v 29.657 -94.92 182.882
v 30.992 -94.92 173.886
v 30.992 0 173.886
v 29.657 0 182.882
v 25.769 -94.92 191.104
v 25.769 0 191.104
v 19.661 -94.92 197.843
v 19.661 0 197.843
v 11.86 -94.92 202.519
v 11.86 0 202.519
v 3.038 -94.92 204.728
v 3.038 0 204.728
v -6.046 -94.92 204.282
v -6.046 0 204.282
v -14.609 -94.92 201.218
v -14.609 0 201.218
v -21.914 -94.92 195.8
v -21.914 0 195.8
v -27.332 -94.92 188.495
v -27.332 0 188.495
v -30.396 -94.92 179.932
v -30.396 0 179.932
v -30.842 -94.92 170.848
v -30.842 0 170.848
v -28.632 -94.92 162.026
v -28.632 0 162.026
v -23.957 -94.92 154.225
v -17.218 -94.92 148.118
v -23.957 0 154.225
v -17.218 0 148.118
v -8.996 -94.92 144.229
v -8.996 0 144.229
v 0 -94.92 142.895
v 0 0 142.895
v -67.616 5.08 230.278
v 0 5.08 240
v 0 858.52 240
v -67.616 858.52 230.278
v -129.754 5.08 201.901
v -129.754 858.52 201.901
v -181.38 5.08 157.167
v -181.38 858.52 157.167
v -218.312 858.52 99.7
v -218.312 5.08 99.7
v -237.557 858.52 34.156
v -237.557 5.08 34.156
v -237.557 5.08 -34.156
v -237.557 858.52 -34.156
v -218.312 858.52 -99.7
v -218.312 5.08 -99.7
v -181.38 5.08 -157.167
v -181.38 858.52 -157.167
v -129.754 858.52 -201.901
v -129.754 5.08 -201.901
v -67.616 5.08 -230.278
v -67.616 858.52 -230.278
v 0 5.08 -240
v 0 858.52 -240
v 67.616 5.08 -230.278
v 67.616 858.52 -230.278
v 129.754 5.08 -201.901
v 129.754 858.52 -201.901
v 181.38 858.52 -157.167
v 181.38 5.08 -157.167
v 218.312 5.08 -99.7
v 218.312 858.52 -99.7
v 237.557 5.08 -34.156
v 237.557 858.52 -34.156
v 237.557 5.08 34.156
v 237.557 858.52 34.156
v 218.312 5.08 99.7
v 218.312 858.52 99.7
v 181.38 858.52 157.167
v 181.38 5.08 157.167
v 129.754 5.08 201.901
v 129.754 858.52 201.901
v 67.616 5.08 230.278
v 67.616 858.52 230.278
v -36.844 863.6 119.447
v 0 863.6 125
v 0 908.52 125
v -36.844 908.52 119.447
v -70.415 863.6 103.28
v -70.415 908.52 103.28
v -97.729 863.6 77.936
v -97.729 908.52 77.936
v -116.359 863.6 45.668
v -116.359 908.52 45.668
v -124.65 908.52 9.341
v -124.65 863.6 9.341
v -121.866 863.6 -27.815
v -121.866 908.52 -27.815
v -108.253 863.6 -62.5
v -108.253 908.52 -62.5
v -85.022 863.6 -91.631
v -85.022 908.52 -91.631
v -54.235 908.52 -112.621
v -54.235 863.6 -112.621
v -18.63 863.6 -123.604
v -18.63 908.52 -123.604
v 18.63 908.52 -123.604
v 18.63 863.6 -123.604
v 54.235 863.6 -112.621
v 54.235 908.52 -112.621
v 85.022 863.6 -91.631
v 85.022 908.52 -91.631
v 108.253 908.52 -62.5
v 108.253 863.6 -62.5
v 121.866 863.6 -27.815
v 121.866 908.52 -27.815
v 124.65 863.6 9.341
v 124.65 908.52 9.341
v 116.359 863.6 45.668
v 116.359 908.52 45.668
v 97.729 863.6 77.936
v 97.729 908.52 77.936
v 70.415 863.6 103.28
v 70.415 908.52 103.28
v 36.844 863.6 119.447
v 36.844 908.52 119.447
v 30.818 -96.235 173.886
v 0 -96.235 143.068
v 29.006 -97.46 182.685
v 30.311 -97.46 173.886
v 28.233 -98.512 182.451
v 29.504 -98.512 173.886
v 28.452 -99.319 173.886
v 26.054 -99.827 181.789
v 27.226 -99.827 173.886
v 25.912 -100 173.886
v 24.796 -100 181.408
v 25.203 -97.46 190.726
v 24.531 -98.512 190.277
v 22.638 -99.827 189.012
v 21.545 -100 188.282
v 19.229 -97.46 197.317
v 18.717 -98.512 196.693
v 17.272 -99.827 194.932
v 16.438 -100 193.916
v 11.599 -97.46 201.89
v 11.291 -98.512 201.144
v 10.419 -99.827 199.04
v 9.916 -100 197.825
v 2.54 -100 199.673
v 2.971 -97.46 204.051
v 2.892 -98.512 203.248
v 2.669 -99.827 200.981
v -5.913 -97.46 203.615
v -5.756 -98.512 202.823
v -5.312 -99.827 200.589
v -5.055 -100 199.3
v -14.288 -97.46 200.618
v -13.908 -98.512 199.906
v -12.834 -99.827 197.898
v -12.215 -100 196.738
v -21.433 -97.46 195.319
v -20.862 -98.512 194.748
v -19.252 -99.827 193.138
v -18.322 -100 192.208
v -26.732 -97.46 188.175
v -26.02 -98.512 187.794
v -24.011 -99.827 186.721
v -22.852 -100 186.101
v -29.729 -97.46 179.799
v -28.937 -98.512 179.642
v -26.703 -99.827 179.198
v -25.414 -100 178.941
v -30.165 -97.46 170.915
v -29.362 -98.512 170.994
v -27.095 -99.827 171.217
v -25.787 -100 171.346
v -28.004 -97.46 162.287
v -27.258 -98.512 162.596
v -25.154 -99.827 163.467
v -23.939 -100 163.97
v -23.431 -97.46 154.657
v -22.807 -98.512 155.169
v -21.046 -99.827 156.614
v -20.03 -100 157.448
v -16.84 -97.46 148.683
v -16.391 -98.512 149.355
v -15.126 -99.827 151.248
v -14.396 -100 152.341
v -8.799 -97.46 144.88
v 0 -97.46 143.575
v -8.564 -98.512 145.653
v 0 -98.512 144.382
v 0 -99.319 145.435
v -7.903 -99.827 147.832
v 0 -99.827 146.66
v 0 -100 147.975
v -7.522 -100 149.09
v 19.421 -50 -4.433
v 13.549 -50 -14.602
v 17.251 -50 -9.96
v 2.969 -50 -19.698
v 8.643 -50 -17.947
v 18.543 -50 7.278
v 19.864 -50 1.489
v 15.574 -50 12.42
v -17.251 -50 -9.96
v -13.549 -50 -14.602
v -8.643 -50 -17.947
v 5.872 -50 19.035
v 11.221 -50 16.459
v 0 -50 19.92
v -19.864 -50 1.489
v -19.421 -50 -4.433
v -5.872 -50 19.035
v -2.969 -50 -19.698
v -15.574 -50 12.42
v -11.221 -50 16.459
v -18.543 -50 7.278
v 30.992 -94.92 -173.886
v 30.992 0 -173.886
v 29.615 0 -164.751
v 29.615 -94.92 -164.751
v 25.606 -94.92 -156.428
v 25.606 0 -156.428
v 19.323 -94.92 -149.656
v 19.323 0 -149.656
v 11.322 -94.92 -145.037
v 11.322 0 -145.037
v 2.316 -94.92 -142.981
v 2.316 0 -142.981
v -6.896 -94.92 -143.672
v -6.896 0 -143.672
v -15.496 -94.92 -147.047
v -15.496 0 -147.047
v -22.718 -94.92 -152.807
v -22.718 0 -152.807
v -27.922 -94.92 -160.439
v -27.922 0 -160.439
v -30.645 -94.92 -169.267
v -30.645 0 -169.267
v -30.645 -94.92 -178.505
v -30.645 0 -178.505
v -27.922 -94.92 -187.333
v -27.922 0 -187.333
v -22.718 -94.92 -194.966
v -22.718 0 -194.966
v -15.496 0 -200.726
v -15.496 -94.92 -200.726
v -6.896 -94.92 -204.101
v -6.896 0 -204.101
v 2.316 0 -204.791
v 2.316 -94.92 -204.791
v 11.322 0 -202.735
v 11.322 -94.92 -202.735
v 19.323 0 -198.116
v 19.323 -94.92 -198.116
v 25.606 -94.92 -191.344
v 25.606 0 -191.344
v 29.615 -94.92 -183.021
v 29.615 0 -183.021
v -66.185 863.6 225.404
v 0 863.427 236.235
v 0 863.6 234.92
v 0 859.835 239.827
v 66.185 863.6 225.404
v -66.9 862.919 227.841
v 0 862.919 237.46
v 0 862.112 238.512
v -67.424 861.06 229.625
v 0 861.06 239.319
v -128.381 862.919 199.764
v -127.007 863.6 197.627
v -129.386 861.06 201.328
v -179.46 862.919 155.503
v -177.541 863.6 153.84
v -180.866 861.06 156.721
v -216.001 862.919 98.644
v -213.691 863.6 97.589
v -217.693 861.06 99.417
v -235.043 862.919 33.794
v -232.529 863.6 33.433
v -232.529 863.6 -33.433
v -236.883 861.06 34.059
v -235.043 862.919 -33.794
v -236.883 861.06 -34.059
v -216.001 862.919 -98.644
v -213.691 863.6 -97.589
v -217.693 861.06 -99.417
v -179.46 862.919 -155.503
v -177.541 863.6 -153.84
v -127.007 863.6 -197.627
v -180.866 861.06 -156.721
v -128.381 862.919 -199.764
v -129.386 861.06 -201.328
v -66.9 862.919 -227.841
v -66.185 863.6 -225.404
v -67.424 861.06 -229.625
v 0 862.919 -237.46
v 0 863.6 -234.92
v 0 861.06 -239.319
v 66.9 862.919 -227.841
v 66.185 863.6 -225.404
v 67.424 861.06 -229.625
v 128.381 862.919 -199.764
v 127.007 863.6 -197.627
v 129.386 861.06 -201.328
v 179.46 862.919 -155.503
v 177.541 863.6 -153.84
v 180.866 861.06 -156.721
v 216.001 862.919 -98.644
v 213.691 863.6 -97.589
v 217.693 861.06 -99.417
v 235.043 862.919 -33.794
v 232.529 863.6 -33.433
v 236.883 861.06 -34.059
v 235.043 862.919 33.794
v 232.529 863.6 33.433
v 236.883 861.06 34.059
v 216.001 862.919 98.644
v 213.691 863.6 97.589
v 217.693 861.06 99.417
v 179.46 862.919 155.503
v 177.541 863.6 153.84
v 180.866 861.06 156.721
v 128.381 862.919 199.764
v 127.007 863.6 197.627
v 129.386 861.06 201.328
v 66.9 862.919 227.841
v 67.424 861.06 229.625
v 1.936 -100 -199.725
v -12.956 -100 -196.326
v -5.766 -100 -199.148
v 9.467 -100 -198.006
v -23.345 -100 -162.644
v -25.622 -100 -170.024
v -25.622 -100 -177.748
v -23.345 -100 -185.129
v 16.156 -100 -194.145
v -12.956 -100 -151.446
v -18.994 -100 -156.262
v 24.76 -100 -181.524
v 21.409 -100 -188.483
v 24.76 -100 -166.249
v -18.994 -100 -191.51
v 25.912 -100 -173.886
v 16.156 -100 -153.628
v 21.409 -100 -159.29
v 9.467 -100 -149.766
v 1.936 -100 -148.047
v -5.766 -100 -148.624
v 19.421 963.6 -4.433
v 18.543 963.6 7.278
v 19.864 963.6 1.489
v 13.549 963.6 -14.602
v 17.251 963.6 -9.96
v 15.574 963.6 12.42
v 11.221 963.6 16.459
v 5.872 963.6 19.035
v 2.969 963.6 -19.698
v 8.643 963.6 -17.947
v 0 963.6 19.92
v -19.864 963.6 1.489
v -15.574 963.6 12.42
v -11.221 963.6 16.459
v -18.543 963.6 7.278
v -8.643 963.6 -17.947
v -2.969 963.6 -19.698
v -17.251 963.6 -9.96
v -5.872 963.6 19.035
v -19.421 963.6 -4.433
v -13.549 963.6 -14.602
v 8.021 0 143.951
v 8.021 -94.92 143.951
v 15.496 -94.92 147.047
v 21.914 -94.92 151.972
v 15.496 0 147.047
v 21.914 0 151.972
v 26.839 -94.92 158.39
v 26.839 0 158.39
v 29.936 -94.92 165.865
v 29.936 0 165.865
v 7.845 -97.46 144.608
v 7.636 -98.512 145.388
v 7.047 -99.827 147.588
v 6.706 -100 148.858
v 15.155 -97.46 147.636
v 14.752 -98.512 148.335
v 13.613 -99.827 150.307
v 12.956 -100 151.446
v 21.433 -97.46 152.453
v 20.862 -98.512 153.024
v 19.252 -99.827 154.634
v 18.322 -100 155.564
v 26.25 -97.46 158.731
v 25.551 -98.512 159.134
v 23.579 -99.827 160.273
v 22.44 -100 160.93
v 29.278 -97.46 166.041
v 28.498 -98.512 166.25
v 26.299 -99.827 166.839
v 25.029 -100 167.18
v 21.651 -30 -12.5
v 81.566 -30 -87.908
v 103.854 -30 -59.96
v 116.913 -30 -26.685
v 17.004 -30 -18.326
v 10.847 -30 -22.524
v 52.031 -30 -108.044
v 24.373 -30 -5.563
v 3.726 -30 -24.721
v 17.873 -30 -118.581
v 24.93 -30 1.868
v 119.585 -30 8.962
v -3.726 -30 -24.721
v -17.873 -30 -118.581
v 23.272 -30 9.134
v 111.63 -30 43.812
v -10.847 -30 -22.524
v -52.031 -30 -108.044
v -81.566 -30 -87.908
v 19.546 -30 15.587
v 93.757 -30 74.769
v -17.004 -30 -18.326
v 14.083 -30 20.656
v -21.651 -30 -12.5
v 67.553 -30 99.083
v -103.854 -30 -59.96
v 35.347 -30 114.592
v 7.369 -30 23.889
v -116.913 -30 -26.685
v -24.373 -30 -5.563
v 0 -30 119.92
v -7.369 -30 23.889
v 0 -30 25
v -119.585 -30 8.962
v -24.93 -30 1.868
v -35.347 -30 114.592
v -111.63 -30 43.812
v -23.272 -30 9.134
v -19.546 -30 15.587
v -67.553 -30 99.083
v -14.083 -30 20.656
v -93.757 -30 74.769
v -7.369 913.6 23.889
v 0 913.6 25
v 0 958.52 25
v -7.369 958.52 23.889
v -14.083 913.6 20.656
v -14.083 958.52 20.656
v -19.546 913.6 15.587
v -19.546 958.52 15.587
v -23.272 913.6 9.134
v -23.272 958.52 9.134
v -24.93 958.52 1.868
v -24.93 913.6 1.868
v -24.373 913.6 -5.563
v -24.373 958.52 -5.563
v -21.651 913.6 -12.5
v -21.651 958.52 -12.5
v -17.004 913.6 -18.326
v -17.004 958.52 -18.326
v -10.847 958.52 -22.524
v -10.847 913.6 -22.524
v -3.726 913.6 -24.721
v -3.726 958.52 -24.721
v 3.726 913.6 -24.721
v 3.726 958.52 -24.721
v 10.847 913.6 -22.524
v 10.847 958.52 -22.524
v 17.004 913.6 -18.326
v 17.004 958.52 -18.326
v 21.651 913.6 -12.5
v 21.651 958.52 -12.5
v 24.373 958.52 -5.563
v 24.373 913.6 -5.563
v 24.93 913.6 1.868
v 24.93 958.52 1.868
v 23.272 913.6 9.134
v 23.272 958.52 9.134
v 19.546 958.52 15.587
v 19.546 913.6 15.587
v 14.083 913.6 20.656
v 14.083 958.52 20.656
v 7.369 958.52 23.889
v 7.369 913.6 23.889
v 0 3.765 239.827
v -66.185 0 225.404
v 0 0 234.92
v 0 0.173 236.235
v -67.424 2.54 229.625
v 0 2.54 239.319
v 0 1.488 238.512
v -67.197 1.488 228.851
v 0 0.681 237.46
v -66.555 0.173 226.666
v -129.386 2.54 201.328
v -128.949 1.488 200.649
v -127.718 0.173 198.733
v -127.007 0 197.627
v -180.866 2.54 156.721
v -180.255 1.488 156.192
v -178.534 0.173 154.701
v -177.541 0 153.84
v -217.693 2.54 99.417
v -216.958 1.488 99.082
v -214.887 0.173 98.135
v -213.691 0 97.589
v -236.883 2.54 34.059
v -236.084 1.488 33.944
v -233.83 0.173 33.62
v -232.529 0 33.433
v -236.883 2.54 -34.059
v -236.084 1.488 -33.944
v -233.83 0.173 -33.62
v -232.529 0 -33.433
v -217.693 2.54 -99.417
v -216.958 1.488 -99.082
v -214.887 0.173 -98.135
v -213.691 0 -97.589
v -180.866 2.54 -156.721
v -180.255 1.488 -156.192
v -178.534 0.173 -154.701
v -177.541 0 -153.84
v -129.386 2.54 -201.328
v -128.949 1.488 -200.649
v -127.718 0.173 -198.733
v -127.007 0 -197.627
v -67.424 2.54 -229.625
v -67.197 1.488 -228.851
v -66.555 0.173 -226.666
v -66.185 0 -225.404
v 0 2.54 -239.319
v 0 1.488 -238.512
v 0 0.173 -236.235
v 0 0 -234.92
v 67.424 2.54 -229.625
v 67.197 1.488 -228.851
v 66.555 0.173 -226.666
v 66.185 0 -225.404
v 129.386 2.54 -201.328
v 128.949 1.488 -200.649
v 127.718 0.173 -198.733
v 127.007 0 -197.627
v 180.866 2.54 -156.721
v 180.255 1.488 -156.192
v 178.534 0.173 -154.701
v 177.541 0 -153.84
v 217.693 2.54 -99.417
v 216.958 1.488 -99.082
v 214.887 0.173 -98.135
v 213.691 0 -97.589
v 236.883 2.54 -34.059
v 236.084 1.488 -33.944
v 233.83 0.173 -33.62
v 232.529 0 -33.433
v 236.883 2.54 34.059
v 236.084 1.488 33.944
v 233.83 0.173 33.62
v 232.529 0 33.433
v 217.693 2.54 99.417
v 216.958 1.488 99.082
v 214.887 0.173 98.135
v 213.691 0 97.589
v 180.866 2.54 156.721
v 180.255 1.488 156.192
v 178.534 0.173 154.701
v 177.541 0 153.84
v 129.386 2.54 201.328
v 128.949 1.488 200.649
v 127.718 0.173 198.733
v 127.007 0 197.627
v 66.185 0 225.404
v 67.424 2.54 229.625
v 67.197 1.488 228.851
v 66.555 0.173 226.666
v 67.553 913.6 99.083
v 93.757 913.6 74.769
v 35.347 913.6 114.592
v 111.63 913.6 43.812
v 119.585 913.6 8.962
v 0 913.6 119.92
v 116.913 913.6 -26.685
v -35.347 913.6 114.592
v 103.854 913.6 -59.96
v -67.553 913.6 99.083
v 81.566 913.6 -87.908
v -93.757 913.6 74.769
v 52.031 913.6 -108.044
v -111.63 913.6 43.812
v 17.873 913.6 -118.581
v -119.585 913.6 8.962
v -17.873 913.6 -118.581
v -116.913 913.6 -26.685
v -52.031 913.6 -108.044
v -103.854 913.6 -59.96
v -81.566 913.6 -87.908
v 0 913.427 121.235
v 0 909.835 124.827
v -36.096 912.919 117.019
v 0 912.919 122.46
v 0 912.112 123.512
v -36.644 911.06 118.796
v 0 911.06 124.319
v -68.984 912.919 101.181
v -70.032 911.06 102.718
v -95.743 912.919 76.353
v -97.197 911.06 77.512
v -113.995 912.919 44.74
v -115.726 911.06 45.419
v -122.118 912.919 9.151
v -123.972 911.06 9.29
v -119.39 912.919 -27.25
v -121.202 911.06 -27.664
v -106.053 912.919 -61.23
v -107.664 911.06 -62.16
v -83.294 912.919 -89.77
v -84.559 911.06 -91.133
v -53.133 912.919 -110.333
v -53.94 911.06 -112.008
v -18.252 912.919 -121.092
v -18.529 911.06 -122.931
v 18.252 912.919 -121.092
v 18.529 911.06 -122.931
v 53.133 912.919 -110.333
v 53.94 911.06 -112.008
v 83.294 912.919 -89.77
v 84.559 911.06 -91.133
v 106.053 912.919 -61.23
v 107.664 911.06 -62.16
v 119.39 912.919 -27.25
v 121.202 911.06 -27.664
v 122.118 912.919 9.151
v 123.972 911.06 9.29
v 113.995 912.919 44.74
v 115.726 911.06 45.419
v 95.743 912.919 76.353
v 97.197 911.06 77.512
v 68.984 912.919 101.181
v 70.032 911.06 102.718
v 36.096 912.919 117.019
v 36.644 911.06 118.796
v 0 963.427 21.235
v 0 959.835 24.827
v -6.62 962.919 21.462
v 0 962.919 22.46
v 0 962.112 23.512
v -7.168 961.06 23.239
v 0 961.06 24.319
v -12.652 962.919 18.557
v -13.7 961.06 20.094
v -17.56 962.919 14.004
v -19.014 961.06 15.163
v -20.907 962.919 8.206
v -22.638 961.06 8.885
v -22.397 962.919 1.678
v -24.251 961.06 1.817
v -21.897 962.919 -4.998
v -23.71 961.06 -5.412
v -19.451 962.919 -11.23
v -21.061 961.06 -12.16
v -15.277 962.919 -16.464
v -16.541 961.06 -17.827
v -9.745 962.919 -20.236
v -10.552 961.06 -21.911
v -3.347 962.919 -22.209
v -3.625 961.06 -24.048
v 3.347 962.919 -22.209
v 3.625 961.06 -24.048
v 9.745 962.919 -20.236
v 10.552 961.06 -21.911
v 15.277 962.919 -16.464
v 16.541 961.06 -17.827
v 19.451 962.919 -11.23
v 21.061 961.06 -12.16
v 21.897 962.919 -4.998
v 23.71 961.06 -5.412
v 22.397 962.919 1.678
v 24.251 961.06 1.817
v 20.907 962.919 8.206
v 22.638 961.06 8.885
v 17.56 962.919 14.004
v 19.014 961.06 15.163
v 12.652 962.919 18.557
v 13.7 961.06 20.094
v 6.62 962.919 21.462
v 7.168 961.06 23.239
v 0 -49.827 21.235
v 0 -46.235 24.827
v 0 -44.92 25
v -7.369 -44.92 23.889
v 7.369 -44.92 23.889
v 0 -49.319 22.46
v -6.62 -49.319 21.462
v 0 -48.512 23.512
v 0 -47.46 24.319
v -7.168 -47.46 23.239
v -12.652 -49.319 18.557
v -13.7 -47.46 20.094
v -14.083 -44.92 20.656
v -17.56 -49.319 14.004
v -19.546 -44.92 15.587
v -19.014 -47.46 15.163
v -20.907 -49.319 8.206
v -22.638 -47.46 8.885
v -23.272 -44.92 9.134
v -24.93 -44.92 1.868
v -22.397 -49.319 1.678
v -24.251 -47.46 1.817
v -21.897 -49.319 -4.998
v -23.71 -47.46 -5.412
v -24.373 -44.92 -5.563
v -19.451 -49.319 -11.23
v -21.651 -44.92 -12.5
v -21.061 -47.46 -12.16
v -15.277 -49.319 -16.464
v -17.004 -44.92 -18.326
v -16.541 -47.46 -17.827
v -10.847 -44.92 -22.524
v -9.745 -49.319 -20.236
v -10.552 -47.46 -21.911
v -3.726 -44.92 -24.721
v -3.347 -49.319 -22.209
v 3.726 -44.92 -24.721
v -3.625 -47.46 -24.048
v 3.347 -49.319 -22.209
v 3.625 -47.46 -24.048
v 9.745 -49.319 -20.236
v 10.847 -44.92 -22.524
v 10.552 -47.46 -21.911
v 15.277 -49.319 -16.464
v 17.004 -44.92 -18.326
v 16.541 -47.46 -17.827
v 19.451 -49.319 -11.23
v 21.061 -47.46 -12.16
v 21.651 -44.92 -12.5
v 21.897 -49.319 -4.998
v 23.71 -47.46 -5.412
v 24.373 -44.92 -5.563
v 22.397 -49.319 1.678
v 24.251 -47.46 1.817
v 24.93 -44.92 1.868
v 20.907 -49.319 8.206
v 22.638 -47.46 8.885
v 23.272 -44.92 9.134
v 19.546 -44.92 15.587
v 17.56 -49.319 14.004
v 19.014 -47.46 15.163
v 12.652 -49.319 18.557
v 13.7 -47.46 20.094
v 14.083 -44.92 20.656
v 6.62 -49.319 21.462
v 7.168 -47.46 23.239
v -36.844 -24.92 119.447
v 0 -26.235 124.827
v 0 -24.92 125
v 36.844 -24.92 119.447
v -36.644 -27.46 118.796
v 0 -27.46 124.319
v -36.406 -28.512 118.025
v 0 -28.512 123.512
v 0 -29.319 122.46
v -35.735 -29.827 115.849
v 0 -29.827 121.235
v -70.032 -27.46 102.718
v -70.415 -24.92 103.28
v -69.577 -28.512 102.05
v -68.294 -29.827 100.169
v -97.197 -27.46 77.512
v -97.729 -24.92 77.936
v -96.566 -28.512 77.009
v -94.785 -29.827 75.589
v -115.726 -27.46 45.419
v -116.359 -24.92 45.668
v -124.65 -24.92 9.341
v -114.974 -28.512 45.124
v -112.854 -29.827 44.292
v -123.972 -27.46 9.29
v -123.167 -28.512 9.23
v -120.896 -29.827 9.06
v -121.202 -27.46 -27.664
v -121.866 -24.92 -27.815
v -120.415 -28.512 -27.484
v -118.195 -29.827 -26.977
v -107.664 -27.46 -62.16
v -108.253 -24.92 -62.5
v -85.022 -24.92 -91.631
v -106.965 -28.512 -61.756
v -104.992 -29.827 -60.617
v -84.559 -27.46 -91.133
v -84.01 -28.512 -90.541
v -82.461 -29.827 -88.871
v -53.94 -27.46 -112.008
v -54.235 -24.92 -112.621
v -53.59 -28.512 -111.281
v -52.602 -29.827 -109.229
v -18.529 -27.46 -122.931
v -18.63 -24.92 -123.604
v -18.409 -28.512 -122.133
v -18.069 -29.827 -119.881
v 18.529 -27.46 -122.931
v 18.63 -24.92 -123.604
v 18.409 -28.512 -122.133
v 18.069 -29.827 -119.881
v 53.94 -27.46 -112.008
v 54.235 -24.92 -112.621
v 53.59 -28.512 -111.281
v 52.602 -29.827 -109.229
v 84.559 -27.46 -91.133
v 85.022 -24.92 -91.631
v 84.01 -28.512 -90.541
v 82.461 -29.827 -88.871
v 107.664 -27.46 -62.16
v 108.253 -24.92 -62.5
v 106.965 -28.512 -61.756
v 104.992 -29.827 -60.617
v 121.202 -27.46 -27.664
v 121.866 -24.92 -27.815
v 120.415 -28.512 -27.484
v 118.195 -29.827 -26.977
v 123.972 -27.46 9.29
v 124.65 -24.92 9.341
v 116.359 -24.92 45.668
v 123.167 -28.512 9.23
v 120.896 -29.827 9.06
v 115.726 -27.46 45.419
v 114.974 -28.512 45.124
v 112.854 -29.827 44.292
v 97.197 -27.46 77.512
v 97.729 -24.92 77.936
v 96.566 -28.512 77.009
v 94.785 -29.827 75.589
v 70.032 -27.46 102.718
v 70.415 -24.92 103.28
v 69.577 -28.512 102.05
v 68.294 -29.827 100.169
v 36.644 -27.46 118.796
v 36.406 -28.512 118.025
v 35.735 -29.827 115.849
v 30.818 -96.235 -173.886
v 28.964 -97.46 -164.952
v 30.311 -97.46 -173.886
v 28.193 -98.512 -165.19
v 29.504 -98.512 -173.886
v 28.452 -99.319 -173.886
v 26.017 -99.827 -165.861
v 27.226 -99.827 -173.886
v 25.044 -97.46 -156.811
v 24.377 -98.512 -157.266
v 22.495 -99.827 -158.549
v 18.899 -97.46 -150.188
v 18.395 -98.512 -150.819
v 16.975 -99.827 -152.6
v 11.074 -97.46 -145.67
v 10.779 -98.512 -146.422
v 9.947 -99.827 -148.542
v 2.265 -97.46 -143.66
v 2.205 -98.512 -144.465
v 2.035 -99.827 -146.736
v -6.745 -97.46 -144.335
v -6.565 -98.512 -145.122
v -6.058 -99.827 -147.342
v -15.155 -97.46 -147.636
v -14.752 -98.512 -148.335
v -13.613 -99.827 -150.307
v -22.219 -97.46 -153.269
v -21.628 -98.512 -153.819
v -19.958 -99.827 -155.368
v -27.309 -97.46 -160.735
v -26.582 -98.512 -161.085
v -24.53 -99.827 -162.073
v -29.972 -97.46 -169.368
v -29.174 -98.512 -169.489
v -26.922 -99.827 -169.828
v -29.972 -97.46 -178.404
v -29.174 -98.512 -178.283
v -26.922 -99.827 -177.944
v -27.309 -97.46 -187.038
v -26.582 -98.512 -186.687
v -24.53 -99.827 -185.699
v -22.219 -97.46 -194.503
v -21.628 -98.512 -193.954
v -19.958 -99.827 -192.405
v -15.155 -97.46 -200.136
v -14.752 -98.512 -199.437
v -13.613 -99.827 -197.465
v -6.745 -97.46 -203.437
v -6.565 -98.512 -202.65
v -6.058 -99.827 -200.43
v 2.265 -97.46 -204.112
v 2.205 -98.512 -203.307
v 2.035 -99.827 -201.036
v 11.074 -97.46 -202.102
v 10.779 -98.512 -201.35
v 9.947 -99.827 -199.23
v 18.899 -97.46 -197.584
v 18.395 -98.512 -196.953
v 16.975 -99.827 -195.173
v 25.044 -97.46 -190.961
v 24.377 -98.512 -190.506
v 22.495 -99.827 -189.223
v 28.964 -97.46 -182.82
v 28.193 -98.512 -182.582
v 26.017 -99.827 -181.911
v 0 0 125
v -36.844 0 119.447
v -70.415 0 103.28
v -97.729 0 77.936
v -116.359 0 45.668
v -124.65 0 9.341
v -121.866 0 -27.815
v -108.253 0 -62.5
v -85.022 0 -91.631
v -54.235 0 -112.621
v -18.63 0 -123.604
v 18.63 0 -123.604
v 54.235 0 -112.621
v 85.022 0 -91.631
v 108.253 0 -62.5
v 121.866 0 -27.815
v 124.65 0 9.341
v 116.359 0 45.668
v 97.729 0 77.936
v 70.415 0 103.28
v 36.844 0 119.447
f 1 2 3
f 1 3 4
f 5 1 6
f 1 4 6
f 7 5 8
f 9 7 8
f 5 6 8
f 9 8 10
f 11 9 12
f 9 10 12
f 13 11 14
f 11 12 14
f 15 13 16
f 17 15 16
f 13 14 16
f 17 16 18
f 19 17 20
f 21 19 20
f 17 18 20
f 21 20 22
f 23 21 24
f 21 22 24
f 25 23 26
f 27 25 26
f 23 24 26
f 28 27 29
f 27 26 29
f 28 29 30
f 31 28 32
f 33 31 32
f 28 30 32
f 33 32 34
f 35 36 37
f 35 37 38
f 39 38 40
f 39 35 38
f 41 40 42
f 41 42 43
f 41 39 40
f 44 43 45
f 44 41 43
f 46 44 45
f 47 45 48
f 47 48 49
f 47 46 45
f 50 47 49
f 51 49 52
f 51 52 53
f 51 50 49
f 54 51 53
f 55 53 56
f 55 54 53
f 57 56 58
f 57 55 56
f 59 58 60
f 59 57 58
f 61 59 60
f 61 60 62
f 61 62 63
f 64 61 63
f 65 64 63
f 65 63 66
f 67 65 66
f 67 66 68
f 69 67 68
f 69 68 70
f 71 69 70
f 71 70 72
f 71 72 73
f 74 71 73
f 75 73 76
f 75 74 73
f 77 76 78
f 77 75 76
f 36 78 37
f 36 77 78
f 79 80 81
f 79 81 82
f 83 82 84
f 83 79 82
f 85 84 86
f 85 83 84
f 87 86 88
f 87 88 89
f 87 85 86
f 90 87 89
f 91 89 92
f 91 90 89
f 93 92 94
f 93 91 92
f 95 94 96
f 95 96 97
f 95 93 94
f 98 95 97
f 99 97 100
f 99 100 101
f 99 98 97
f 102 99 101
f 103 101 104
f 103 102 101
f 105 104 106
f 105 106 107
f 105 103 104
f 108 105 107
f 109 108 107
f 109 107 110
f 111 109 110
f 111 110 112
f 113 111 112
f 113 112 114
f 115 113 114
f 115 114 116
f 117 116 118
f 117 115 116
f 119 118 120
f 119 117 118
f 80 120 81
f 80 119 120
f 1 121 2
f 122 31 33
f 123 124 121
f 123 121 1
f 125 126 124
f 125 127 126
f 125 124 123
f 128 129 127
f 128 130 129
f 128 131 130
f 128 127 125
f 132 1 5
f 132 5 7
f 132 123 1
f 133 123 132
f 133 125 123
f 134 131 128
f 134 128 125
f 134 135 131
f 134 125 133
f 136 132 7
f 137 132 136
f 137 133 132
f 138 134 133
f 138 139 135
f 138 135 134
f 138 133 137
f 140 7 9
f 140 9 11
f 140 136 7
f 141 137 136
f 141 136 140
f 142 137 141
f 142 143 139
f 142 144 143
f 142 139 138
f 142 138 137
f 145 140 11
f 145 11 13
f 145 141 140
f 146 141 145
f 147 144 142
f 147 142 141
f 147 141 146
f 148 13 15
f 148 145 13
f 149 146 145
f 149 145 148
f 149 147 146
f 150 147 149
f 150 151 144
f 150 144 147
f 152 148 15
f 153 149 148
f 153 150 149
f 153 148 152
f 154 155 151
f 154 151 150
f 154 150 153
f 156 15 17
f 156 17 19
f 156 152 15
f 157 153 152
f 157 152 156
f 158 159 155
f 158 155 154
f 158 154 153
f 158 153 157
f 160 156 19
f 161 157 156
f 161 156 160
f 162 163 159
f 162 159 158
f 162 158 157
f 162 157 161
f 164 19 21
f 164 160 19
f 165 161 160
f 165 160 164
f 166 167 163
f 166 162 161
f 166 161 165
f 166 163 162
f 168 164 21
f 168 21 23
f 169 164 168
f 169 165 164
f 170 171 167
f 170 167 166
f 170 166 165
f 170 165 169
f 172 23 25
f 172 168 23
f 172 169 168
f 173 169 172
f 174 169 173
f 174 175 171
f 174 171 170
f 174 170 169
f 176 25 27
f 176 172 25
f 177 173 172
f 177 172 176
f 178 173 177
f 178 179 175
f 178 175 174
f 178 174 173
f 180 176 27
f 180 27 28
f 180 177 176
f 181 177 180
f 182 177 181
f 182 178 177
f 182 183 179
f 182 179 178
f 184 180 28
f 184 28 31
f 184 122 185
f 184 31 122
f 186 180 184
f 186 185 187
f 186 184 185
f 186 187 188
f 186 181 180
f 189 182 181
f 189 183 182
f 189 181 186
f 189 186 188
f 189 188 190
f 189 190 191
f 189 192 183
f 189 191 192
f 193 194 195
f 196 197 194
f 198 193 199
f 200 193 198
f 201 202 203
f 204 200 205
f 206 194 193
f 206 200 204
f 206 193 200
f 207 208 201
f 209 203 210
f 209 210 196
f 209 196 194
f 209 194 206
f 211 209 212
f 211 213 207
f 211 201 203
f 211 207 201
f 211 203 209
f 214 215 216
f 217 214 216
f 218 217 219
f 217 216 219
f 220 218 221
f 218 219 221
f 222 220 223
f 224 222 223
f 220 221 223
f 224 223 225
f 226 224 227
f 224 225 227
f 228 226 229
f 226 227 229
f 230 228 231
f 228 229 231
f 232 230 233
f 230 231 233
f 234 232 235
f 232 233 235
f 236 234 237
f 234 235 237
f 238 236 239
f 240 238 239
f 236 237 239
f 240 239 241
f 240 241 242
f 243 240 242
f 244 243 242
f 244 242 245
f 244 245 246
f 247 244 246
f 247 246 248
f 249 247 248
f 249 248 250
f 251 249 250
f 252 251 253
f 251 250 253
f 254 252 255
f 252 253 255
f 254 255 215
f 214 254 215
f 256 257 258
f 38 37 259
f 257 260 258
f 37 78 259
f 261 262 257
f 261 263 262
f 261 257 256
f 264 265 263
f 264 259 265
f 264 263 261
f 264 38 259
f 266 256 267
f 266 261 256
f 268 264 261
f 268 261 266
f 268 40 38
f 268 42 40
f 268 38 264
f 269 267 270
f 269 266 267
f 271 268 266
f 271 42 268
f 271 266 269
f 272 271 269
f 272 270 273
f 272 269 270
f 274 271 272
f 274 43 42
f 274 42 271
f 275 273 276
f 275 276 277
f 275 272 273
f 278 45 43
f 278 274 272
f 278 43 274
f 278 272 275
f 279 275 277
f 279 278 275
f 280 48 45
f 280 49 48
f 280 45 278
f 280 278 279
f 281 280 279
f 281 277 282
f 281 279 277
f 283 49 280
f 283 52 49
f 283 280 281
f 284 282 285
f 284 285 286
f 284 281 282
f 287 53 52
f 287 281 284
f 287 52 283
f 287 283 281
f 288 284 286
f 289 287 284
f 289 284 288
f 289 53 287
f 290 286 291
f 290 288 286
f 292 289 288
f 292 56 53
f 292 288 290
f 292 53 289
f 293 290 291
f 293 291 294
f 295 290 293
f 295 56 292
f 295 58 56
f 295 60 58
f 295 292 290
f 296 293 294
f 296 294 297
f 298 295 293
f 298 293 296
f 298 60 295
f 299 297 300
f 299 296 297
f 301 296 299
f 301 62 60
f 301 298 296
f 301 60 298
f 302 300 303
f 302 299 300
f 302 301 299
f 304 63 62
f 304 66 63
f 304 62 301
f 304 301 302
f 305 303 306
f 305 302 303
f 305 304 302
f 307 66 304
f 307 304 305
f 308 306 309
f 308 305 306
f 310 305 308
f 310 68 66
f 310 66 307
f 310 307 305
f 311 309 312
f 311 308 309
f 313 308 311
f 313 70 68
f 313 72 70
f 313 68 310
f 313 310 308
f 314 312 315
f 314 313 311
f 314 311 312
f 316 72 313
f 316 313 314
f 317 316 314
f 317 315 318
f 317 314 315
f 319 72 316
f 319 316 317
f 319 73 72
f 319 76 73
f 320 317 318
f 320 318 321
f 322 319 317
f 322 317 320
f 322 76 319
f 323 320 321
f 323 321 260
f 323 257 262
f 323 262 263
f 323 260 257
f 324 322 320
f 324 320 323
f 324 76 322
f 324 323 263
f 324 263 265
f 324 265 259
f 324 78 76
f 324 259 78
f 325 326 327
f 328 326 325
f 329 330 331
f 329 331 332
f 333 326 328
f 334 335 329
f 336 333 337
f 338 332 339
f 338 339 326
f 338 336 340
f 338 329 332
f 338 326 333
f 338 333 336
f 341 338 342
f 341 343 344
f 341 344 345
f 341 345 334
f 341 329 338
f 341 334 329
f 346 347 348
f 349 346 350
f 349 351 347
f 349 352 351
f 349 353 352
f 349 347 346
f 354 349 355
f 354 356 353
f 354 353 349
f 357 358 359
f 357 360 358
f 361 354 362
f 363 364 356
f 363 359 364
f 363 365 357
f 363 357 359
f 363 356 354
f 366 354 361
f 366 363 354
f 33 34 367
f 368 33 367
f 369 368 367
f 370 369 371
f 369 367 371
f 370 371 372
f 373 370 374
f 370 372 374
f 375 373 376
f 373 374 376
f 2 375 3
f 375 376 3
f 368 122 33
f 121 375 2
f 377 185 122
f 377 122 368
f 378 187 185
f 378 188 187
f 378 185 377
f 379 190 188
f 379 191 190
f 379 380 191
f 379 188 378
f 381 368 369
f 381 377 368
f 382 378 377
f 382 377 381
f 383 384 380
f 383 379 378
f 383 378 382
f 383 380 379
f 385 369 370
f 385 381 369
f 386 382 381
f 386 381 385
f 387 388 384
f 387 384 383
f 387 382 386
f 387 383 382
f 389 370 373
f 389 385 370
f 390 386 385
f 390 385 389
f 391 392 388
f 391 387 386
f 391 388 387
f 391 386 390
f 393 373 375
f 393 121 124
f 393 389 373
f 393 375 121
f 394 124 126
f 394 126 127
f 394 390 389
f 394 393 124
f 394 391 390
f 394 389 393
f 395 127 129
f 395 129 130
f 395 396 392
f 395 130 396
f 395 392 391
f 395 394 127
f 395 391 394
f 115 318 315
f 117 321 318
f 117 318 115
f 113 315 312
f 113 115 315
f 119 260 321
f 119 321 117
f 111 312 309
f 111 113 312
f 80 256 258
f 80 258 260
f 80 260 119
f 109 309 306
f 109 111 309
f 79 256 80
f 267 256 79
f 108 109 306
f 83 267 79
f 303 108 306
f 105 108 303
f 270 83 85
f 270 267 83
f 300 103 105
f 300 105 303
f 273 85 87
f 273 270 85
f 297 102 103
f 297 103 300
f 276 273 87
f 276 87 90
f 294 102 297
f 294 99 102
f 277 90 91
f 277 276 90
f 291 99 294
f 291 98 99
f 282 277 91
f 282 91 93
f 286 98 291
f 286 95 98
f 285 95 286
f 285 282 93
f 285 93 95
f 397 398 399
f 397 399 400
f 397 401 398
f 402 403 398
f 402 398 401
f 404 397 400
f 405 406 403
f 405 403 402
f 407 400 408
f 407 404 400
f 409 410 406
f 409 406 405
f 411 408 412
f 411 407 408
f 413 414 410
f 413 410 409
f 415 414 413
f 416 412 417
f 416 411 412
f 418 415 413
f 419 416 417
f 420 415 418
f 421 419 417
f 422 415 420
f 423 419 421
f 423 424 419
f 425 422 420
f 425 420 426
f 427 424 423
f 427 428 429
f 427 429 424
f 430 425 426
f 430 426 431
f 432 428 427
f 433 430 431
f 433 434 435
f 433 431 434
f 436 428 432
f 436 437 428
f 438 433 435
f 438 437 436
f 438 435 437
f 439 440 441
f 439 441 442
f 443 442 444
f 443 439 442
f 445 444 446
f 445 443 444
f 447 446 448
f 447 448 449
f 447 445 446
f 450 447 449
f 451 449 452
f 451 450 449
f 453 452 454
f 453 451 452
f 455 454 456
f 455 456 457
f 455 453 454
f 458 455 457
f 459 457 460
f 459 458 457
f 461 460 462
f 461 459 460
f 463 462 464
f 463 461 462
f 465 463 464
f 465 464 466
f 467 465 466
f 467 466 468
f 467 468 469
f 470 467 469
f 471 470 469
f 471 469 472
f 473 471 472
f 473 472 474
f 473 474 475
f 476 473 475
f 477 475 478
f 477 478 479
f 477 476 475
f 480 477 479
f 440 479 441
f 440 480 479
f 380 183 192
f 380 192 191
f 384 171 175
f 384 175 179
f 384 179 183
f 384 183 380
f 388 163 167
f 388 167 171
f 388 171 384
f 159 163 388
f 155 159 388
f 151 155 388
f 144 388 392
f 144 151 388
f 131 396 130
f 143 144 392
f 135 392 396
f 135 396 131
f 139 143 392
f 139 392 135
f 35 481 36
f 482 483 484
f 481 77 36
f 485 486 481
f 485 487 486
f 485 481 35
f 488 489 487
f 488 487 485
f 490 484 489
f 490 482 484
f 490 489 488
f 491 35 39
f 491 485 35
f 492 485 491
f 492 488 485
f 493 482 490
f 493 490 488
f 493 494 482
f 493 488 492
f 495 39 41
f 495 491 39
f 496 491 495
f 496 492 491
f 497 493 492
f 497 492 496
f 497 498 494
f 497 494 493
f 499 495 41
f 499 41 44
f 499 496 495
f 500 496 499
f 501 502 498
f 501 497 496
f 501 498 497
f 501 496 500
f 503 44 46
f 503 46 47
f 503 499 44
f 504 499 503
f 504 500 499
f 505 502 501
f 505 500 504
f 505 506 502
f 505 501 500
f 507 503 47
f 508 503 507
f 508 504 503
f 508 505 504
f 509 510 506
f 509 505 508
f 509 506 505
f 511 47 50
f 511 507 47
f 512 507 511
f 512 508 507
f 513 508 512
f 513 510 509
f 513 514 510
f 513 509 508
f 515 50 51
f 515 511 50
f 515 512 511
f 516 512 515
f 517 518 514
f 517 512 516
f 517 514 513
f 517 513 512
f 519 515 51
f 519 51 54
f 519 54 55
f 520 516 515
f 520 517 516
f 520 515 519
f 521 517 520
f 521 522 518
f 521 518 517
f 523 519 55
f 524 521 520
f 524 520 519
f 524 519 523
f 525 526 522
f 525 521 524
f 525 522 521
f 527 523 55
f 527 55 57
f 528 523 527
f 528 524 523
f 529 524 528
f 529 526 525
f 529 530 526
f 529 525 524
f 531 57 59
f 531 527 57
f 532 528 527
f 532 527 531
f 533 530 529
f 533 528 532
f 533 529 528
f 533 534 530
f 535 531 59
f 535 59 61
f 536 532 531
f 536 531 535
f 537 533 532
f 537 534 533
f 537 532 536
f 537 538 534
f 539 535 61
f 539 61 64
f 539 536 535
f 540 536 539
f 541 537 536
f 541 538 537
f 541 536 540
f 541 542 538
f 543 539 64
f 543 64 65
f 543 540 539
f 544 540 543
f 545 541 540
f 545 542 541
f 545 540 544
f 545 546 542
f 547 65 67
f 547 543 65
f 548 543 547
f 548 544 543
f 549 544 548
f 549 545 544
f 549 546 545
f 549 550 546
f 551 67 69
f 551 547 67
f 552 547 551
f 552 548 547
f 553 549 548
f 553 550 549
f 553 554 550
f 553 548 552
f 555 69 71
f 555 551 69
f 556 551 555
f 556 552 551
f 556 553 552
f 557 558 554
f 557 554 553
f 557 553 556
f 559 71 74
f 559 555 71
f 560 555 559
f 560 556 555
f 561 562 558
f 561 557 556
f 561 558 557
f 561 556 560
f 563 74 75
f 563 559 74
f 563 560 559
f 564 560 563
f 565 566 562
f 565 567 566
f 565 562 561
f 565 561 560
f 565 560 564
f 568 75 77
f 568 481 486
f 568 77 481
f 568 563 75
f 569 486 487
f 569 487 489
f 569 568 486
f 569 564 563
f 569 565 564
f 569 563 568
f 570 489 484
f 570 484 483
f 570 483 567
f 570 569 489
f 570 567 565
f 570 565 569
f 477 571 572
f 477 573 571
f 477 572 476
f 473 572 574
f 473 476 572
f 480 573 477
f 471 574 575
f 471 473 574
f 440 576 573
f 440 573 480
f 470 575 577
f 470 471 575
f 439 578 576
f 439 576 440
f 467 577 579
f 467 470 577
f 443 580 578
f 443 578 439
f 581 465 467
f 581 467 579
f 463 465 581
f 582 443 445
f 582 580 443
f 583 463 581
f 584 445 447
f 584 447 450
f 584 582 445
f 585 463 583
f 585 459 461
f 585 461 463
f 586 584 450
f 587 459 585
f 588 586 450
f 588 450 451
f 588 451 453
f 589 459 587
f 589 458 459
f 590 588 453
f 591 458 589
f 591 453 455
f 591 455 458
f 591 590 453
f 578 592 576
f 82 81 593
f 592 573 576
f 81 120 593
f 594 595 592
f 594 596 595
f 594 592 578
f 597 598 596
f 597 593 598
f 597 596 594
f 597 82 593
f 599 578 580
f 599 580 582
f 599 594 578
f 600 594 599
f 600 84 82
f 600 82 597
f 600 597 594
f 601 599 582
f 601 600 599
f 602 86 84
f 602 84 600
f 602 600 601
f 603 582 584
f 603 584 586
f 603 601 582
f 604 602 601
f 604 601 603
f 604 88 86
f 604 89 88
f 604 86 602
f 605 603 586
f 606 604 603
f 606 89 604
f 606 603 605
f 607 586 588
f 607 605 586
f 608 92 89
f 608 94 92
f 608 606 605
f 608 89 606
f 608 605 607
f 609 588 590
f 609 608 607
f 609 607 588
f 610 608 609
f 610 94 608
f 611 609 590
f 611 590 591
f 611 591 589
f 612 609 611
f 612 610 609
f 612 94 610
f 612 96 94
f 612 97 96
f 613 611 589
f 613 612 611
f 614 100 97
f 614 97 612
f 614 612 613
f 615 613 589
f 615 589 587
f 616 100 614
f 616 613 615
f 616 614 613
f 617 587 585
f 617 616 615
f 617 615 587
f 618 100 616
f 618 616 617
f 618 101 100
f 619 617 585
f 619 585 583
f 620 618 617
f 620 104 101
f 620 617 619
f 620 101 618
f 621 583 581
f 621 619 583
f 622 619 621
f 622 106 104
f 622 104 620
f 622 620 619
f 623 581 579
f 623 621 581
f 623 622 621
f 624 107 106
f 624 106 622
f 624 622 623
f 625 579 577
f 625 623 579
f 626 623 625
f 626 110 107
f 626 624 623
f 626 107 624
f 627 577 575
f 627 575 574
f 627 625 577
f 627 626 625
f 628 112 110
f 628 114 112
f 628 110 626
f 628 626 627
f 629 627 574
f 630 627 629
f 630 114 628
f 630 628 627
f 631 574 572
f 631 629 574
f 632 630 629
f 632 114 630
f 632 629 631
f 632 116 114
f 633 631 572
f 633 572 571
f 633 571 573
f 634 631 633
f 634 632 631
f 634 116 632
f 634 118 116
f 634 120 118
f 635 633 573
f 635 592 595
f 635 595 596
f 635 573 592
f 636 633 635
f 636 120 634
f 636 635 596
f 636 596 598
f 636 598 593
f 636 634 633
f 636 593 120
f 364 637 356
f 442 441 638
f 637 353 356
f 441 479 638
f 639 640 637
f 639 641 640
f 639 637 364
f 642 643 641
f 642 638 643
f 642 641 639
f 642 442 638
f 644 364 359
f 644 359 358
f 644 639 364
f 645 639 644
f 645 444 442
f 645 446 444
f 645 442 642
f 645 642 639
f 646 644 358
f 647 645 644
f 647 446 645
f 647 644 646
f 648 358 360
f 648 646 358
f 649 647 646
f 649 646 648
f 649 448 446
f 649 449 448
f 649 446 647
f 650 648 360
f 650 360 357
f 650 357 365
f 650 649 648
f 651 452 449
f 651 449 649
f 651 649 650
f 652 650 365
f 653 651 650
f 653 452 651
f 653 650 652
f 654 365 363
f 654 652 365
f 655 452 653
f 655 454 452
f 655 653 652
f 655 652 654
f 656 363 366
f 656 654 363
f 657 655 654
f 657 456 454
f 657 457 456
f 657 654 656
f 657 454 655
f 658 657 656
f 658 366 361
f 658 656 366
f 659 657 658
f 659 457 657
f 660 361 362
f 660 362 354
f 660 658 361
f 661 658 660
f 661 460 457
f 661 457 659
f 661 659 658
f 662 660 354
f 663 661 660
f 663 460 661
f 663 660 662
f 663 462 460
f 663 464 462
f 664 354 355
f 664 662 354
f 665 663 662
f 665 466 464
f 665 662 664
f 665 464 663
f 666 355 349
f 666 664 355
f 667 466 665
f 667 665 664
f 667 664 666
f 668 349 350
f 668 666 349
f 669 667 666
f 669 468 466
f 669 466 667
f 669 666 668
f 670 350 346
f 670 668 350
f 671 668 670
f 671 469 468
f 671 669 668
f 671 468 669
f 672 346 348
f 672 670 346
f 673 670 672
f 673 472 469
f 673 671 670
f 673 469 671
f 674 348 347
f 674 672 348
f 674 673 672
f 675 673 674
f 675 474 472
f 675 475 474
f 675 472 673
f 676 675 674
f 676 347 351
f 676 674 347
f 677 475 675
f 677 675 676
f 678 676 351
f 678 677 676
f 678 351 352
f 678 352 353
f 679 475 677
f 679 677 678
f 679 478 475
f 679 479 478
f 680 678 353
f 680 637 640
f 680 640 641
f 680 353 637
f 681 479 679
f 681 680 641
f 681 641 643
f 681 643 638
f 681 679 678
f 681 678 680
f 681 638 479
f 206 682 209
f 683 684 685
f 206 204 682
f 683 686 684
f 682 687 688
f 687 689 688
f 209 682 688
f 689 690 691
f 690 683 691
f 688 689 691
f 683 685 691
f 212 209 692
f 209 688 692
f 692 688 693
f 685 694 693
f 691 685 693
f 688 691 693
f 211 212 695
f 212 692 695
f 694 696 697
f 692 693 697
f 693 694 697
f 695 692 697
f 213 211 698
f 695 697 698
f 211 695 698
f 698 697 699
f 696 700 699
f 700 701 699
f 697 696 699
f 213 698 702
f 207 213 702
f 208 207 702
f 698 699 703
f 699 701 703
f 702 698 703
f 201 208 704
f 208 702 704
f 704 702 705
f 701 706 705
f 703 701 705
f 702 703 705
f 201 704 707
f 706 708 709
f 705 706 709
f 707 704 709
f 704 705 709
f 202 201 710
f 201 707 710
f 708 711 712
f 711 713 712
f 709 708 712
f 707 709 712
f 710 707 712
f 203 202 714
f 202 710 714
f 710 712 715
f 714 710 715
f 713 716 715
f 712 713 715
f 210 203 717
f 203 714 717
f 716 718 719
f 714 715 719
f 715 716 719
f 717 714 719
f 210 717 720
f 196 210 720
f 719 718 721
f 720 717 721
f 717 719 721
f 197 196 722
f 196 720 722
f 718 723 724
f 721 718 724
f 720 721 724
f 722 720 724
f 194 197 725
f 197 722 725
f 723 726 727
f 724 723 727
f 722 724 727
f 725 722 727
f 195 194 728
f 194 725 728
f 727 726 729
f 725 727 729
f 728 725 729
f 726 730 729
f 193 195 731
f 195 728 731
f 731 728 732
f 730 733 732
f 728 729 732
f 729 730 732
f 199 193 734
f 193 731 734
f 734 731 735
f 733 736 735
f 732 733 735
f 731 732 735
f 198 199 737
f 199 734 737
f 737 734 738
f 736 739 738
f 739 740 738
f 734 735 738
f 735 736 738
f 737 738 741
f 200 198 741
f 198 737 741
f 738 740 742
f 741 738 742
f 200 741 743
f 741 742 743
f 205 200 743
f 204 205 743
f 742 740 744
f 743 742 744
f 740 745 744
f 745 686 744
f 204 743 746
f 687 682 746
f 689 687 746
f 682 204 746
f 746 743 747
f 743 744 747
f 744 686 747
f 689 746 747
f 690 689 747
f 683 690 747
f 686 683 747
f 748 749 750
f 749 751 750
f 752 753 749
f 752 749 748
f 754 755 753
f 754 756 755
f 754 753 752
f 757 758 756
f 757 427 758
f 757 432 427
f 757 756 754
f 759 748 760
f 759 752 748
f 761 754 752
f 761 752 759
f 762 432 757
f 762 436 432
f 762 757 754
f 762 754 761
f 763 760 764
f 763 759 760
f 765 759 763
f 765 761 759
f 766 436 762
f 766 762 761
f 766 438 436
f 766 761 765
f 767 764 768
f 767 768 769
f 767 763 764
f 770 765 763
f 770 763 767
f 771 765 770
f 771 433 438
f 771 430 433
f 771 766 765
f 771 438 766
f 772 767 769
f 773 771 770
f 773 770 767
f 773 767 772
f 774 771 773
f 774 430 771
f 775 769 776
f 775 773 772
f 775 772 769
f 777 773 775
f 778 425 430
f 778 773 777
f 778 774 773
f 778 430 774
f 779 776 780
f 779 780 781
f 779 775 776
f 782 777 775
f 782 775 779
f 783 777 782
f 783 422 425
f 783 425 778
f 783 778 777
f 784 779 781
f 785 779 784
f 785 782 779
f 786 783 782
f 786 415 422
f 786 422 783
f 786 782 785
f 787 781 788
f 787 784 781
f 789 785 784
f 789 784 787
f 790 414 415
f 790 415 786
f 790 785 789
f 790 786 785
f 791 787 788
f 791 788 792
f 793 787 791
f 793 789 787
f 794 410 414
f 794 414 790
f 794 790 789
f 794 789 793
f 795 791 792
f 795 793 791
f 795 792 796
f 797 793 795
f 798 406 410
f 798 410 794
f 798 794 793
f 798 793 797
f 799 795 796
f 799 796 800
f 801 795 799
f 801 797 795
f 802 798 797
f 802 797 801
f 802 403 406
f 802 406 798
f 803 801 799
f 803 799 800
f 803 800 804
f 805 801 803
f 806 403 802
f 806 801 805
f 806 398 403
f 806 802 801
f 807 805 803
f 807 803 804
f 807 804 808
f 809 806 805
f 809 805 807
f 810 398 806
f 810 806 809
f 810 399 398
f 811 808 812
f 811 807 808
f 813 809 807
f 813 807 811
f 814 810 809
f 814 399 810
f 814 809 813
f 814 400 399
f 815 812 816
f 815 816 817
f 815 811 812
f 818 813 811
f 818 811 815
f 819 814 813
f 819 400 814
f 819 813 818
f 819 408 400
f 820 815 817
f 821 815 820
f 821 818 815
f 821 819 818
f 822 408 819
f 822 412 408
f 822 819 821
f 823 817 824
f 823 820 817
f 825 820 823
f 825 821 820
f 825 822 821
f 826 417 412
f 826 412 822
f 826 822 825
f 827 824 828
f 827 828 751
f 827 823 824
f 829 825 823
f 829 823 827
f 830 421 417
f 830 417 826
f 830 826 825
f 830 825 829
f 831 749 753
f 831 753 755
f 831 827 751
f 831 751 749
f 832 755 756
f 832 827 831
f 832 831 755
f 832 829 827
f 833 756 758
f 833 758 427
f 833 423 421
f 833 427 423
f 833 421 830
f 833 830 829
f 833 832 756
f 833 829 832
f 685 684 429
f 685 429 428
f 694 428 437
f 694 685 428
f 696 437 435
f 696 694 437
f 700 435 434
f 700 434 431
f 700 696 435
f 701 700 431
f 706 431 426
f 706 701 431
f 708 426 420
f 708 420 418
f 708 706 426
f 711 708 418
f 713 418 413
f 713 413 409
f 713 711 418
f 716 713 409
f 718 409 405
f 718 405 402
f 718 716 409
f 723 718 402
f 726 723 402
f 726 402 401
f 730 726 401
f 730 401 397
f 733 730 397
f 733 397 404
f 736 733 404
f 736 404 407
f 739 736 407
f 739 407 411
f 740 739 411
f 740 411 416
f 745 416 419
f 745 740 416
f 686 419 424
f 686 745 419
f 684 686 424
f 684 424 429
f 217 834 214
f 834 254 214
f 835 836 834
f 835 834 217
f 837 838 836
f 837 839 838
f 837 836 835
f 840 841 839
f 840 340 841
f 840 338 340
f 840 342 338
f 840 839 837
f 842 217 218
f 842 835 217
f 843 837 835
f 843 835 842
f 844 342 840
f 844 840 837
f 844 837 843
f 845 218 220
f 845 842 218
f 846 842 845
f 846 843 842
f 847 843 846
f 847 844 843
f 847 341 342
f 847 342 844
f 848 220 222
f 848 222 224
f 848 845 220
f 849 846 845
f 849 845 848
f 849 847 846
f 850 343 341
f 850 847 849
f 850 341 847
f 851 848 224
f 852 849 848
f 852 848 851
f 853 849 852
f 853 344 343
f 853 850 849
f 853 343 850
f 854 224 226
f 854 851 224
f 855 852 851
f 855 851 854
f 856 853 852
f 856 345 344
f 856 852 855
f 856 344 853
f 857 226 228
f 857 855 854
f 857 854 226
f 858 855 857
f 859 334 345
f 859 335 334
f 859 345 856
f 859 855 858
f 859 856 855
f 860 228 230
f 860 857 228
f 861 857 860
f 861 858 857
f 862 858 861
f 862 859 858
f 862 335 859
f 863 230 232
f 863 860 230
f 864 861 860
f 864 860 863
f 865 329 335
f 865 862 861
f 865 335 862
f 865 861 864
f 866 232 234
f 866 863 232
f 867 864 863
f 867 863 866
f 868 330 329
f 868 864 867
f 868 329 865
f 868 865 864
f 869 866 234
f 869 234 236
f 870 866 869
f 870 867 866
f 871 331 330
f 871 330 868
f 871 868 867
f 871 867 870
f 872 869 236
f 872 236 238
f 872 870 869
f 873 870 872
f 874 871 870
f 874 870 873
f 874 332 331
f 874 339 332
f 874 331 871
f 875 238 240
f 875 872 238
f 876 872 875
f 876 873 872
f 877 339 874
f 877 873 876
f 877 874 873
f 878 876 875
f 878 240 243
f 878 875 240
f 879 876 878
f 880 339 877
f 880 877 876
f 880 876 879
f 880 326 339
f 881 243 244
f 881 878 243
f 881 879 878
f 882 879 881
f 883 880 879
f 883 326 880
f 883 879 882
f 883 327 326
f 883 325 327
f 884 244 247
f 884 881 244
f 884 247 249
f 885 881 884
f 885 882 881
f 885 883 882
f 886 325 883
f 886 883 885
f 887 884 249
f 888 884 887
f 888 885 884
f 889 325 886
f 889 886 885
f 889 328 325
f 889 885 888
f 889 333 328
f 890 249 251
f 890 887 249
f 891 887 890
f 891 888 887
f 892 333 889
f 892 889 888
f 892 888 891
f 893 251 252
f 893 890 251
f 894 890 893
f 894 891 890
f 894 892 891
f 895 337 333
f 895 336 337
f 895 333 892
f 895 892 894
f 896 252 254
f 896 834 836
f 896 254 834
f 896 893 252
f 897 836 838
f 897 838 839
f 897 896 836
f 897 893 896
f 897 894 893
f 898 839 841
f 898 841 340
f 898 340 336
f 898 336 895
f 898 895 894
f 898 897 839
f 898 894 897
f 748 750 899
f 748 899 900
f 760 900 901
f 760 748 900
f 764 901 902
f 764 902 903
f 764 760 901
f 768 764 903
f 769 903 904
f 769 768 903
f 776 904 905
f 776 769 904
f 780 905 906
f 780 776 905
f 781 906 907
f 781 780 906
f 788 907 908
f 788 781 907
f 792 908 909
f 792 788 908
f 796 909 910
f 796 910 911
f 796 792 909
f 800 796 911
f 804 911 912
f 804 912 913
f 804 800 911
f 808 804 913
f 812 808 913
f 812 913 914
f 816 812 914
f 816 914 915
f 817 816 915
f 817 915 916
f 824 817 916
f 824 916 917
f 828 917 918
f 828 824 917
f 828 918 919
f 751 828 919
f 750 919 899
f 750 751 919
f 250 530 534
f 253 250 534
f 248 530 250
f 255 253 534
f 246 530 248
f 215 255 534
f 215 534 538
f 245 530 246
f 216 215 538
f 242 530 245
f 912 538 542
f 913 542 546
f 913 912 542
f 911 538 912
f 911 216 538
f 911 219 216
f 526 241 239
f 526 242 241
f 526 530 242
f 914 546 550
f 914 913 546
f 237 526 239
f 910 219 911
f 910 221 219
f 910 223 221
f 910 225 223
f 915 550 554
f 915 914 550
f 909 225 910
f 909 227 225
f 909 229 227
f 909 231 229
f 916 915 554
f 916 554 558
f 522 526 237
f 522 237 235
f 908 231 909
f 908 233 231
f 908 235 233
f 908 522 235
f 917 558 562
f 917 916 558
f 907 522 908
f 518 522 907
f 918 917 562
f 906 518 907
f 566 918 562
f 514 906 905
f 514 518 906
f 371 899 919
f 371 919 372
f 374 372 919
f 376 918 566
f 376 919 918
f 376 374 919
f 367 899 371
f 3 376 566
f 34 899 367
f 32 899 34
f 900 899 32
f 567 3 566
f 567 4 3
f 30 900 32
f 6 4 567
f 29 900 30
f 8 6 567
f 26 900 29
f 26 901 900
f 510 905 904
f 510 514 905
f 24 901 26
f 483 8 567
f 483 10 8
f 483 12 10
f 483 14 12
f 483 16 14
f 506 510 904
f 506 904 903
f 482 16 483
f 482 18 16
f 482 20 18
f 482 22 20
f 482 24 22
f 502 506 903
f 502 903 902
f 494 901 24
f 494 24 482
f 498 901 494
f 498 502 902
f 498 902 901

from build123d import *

# Parameters (mm, degrees)
F2_R     = 5.08
F3_R     = 30.991521
F4_DEPTH = 100
F5_R     = 5.08


with BuildPart() as f1:
    # F0 (on Right) → F1 (revolve)
    with BuildSketch(Plane.YZ):
        Polygon((-50, 25), (-50, 0), (963.6, 0), (963.6, 25), (913.6, 25), (913.6, 125), (863.6, 125), (863.6, 240), (0, 240), (0, 125), (-30, 125), (-30, 25), align=None)
    revolve(axis=Axis((0, 456.8, 0), (0, -1, 0)))

    # F2
    f2_edges = [f1.edges().sort_by_distance(p)[0] for p in [
        (0, 863.6, -240),
        (0, 913.6, -125),
        (0, 963.6, -25),
        (0, 0, -240),
        (0, -30, -125),
        (0, -50, -25),
    ]]
    fillet(f2_edges, radius=F2_R)

    # F3 (on face) → F4 (join)
    with BuildSketch(Plane.XZ):
        with BuildLine():
            ThreePointArc((30.991518, 173.886114), (-21.914312, 195.800426), (0, 142.894596))
            ThreePointArc((0, 142.894596), (21.914312, 151.971802), (30.991518, 173.886114))
        make_face()
        with Locations((0, -173.886105)):
            Circle(F3_R)
    extrude(amount=F4_DEPTH)

    # F5
    f5_edges = [f1.edges().sort_by_distance(p)[0] for p in [
        (-30.991521, -100, -173.886105),
        (0, -100, 204.877632),
    ]]
    fillet(f5_edges, radius=F5_R)


solid = f1.part
